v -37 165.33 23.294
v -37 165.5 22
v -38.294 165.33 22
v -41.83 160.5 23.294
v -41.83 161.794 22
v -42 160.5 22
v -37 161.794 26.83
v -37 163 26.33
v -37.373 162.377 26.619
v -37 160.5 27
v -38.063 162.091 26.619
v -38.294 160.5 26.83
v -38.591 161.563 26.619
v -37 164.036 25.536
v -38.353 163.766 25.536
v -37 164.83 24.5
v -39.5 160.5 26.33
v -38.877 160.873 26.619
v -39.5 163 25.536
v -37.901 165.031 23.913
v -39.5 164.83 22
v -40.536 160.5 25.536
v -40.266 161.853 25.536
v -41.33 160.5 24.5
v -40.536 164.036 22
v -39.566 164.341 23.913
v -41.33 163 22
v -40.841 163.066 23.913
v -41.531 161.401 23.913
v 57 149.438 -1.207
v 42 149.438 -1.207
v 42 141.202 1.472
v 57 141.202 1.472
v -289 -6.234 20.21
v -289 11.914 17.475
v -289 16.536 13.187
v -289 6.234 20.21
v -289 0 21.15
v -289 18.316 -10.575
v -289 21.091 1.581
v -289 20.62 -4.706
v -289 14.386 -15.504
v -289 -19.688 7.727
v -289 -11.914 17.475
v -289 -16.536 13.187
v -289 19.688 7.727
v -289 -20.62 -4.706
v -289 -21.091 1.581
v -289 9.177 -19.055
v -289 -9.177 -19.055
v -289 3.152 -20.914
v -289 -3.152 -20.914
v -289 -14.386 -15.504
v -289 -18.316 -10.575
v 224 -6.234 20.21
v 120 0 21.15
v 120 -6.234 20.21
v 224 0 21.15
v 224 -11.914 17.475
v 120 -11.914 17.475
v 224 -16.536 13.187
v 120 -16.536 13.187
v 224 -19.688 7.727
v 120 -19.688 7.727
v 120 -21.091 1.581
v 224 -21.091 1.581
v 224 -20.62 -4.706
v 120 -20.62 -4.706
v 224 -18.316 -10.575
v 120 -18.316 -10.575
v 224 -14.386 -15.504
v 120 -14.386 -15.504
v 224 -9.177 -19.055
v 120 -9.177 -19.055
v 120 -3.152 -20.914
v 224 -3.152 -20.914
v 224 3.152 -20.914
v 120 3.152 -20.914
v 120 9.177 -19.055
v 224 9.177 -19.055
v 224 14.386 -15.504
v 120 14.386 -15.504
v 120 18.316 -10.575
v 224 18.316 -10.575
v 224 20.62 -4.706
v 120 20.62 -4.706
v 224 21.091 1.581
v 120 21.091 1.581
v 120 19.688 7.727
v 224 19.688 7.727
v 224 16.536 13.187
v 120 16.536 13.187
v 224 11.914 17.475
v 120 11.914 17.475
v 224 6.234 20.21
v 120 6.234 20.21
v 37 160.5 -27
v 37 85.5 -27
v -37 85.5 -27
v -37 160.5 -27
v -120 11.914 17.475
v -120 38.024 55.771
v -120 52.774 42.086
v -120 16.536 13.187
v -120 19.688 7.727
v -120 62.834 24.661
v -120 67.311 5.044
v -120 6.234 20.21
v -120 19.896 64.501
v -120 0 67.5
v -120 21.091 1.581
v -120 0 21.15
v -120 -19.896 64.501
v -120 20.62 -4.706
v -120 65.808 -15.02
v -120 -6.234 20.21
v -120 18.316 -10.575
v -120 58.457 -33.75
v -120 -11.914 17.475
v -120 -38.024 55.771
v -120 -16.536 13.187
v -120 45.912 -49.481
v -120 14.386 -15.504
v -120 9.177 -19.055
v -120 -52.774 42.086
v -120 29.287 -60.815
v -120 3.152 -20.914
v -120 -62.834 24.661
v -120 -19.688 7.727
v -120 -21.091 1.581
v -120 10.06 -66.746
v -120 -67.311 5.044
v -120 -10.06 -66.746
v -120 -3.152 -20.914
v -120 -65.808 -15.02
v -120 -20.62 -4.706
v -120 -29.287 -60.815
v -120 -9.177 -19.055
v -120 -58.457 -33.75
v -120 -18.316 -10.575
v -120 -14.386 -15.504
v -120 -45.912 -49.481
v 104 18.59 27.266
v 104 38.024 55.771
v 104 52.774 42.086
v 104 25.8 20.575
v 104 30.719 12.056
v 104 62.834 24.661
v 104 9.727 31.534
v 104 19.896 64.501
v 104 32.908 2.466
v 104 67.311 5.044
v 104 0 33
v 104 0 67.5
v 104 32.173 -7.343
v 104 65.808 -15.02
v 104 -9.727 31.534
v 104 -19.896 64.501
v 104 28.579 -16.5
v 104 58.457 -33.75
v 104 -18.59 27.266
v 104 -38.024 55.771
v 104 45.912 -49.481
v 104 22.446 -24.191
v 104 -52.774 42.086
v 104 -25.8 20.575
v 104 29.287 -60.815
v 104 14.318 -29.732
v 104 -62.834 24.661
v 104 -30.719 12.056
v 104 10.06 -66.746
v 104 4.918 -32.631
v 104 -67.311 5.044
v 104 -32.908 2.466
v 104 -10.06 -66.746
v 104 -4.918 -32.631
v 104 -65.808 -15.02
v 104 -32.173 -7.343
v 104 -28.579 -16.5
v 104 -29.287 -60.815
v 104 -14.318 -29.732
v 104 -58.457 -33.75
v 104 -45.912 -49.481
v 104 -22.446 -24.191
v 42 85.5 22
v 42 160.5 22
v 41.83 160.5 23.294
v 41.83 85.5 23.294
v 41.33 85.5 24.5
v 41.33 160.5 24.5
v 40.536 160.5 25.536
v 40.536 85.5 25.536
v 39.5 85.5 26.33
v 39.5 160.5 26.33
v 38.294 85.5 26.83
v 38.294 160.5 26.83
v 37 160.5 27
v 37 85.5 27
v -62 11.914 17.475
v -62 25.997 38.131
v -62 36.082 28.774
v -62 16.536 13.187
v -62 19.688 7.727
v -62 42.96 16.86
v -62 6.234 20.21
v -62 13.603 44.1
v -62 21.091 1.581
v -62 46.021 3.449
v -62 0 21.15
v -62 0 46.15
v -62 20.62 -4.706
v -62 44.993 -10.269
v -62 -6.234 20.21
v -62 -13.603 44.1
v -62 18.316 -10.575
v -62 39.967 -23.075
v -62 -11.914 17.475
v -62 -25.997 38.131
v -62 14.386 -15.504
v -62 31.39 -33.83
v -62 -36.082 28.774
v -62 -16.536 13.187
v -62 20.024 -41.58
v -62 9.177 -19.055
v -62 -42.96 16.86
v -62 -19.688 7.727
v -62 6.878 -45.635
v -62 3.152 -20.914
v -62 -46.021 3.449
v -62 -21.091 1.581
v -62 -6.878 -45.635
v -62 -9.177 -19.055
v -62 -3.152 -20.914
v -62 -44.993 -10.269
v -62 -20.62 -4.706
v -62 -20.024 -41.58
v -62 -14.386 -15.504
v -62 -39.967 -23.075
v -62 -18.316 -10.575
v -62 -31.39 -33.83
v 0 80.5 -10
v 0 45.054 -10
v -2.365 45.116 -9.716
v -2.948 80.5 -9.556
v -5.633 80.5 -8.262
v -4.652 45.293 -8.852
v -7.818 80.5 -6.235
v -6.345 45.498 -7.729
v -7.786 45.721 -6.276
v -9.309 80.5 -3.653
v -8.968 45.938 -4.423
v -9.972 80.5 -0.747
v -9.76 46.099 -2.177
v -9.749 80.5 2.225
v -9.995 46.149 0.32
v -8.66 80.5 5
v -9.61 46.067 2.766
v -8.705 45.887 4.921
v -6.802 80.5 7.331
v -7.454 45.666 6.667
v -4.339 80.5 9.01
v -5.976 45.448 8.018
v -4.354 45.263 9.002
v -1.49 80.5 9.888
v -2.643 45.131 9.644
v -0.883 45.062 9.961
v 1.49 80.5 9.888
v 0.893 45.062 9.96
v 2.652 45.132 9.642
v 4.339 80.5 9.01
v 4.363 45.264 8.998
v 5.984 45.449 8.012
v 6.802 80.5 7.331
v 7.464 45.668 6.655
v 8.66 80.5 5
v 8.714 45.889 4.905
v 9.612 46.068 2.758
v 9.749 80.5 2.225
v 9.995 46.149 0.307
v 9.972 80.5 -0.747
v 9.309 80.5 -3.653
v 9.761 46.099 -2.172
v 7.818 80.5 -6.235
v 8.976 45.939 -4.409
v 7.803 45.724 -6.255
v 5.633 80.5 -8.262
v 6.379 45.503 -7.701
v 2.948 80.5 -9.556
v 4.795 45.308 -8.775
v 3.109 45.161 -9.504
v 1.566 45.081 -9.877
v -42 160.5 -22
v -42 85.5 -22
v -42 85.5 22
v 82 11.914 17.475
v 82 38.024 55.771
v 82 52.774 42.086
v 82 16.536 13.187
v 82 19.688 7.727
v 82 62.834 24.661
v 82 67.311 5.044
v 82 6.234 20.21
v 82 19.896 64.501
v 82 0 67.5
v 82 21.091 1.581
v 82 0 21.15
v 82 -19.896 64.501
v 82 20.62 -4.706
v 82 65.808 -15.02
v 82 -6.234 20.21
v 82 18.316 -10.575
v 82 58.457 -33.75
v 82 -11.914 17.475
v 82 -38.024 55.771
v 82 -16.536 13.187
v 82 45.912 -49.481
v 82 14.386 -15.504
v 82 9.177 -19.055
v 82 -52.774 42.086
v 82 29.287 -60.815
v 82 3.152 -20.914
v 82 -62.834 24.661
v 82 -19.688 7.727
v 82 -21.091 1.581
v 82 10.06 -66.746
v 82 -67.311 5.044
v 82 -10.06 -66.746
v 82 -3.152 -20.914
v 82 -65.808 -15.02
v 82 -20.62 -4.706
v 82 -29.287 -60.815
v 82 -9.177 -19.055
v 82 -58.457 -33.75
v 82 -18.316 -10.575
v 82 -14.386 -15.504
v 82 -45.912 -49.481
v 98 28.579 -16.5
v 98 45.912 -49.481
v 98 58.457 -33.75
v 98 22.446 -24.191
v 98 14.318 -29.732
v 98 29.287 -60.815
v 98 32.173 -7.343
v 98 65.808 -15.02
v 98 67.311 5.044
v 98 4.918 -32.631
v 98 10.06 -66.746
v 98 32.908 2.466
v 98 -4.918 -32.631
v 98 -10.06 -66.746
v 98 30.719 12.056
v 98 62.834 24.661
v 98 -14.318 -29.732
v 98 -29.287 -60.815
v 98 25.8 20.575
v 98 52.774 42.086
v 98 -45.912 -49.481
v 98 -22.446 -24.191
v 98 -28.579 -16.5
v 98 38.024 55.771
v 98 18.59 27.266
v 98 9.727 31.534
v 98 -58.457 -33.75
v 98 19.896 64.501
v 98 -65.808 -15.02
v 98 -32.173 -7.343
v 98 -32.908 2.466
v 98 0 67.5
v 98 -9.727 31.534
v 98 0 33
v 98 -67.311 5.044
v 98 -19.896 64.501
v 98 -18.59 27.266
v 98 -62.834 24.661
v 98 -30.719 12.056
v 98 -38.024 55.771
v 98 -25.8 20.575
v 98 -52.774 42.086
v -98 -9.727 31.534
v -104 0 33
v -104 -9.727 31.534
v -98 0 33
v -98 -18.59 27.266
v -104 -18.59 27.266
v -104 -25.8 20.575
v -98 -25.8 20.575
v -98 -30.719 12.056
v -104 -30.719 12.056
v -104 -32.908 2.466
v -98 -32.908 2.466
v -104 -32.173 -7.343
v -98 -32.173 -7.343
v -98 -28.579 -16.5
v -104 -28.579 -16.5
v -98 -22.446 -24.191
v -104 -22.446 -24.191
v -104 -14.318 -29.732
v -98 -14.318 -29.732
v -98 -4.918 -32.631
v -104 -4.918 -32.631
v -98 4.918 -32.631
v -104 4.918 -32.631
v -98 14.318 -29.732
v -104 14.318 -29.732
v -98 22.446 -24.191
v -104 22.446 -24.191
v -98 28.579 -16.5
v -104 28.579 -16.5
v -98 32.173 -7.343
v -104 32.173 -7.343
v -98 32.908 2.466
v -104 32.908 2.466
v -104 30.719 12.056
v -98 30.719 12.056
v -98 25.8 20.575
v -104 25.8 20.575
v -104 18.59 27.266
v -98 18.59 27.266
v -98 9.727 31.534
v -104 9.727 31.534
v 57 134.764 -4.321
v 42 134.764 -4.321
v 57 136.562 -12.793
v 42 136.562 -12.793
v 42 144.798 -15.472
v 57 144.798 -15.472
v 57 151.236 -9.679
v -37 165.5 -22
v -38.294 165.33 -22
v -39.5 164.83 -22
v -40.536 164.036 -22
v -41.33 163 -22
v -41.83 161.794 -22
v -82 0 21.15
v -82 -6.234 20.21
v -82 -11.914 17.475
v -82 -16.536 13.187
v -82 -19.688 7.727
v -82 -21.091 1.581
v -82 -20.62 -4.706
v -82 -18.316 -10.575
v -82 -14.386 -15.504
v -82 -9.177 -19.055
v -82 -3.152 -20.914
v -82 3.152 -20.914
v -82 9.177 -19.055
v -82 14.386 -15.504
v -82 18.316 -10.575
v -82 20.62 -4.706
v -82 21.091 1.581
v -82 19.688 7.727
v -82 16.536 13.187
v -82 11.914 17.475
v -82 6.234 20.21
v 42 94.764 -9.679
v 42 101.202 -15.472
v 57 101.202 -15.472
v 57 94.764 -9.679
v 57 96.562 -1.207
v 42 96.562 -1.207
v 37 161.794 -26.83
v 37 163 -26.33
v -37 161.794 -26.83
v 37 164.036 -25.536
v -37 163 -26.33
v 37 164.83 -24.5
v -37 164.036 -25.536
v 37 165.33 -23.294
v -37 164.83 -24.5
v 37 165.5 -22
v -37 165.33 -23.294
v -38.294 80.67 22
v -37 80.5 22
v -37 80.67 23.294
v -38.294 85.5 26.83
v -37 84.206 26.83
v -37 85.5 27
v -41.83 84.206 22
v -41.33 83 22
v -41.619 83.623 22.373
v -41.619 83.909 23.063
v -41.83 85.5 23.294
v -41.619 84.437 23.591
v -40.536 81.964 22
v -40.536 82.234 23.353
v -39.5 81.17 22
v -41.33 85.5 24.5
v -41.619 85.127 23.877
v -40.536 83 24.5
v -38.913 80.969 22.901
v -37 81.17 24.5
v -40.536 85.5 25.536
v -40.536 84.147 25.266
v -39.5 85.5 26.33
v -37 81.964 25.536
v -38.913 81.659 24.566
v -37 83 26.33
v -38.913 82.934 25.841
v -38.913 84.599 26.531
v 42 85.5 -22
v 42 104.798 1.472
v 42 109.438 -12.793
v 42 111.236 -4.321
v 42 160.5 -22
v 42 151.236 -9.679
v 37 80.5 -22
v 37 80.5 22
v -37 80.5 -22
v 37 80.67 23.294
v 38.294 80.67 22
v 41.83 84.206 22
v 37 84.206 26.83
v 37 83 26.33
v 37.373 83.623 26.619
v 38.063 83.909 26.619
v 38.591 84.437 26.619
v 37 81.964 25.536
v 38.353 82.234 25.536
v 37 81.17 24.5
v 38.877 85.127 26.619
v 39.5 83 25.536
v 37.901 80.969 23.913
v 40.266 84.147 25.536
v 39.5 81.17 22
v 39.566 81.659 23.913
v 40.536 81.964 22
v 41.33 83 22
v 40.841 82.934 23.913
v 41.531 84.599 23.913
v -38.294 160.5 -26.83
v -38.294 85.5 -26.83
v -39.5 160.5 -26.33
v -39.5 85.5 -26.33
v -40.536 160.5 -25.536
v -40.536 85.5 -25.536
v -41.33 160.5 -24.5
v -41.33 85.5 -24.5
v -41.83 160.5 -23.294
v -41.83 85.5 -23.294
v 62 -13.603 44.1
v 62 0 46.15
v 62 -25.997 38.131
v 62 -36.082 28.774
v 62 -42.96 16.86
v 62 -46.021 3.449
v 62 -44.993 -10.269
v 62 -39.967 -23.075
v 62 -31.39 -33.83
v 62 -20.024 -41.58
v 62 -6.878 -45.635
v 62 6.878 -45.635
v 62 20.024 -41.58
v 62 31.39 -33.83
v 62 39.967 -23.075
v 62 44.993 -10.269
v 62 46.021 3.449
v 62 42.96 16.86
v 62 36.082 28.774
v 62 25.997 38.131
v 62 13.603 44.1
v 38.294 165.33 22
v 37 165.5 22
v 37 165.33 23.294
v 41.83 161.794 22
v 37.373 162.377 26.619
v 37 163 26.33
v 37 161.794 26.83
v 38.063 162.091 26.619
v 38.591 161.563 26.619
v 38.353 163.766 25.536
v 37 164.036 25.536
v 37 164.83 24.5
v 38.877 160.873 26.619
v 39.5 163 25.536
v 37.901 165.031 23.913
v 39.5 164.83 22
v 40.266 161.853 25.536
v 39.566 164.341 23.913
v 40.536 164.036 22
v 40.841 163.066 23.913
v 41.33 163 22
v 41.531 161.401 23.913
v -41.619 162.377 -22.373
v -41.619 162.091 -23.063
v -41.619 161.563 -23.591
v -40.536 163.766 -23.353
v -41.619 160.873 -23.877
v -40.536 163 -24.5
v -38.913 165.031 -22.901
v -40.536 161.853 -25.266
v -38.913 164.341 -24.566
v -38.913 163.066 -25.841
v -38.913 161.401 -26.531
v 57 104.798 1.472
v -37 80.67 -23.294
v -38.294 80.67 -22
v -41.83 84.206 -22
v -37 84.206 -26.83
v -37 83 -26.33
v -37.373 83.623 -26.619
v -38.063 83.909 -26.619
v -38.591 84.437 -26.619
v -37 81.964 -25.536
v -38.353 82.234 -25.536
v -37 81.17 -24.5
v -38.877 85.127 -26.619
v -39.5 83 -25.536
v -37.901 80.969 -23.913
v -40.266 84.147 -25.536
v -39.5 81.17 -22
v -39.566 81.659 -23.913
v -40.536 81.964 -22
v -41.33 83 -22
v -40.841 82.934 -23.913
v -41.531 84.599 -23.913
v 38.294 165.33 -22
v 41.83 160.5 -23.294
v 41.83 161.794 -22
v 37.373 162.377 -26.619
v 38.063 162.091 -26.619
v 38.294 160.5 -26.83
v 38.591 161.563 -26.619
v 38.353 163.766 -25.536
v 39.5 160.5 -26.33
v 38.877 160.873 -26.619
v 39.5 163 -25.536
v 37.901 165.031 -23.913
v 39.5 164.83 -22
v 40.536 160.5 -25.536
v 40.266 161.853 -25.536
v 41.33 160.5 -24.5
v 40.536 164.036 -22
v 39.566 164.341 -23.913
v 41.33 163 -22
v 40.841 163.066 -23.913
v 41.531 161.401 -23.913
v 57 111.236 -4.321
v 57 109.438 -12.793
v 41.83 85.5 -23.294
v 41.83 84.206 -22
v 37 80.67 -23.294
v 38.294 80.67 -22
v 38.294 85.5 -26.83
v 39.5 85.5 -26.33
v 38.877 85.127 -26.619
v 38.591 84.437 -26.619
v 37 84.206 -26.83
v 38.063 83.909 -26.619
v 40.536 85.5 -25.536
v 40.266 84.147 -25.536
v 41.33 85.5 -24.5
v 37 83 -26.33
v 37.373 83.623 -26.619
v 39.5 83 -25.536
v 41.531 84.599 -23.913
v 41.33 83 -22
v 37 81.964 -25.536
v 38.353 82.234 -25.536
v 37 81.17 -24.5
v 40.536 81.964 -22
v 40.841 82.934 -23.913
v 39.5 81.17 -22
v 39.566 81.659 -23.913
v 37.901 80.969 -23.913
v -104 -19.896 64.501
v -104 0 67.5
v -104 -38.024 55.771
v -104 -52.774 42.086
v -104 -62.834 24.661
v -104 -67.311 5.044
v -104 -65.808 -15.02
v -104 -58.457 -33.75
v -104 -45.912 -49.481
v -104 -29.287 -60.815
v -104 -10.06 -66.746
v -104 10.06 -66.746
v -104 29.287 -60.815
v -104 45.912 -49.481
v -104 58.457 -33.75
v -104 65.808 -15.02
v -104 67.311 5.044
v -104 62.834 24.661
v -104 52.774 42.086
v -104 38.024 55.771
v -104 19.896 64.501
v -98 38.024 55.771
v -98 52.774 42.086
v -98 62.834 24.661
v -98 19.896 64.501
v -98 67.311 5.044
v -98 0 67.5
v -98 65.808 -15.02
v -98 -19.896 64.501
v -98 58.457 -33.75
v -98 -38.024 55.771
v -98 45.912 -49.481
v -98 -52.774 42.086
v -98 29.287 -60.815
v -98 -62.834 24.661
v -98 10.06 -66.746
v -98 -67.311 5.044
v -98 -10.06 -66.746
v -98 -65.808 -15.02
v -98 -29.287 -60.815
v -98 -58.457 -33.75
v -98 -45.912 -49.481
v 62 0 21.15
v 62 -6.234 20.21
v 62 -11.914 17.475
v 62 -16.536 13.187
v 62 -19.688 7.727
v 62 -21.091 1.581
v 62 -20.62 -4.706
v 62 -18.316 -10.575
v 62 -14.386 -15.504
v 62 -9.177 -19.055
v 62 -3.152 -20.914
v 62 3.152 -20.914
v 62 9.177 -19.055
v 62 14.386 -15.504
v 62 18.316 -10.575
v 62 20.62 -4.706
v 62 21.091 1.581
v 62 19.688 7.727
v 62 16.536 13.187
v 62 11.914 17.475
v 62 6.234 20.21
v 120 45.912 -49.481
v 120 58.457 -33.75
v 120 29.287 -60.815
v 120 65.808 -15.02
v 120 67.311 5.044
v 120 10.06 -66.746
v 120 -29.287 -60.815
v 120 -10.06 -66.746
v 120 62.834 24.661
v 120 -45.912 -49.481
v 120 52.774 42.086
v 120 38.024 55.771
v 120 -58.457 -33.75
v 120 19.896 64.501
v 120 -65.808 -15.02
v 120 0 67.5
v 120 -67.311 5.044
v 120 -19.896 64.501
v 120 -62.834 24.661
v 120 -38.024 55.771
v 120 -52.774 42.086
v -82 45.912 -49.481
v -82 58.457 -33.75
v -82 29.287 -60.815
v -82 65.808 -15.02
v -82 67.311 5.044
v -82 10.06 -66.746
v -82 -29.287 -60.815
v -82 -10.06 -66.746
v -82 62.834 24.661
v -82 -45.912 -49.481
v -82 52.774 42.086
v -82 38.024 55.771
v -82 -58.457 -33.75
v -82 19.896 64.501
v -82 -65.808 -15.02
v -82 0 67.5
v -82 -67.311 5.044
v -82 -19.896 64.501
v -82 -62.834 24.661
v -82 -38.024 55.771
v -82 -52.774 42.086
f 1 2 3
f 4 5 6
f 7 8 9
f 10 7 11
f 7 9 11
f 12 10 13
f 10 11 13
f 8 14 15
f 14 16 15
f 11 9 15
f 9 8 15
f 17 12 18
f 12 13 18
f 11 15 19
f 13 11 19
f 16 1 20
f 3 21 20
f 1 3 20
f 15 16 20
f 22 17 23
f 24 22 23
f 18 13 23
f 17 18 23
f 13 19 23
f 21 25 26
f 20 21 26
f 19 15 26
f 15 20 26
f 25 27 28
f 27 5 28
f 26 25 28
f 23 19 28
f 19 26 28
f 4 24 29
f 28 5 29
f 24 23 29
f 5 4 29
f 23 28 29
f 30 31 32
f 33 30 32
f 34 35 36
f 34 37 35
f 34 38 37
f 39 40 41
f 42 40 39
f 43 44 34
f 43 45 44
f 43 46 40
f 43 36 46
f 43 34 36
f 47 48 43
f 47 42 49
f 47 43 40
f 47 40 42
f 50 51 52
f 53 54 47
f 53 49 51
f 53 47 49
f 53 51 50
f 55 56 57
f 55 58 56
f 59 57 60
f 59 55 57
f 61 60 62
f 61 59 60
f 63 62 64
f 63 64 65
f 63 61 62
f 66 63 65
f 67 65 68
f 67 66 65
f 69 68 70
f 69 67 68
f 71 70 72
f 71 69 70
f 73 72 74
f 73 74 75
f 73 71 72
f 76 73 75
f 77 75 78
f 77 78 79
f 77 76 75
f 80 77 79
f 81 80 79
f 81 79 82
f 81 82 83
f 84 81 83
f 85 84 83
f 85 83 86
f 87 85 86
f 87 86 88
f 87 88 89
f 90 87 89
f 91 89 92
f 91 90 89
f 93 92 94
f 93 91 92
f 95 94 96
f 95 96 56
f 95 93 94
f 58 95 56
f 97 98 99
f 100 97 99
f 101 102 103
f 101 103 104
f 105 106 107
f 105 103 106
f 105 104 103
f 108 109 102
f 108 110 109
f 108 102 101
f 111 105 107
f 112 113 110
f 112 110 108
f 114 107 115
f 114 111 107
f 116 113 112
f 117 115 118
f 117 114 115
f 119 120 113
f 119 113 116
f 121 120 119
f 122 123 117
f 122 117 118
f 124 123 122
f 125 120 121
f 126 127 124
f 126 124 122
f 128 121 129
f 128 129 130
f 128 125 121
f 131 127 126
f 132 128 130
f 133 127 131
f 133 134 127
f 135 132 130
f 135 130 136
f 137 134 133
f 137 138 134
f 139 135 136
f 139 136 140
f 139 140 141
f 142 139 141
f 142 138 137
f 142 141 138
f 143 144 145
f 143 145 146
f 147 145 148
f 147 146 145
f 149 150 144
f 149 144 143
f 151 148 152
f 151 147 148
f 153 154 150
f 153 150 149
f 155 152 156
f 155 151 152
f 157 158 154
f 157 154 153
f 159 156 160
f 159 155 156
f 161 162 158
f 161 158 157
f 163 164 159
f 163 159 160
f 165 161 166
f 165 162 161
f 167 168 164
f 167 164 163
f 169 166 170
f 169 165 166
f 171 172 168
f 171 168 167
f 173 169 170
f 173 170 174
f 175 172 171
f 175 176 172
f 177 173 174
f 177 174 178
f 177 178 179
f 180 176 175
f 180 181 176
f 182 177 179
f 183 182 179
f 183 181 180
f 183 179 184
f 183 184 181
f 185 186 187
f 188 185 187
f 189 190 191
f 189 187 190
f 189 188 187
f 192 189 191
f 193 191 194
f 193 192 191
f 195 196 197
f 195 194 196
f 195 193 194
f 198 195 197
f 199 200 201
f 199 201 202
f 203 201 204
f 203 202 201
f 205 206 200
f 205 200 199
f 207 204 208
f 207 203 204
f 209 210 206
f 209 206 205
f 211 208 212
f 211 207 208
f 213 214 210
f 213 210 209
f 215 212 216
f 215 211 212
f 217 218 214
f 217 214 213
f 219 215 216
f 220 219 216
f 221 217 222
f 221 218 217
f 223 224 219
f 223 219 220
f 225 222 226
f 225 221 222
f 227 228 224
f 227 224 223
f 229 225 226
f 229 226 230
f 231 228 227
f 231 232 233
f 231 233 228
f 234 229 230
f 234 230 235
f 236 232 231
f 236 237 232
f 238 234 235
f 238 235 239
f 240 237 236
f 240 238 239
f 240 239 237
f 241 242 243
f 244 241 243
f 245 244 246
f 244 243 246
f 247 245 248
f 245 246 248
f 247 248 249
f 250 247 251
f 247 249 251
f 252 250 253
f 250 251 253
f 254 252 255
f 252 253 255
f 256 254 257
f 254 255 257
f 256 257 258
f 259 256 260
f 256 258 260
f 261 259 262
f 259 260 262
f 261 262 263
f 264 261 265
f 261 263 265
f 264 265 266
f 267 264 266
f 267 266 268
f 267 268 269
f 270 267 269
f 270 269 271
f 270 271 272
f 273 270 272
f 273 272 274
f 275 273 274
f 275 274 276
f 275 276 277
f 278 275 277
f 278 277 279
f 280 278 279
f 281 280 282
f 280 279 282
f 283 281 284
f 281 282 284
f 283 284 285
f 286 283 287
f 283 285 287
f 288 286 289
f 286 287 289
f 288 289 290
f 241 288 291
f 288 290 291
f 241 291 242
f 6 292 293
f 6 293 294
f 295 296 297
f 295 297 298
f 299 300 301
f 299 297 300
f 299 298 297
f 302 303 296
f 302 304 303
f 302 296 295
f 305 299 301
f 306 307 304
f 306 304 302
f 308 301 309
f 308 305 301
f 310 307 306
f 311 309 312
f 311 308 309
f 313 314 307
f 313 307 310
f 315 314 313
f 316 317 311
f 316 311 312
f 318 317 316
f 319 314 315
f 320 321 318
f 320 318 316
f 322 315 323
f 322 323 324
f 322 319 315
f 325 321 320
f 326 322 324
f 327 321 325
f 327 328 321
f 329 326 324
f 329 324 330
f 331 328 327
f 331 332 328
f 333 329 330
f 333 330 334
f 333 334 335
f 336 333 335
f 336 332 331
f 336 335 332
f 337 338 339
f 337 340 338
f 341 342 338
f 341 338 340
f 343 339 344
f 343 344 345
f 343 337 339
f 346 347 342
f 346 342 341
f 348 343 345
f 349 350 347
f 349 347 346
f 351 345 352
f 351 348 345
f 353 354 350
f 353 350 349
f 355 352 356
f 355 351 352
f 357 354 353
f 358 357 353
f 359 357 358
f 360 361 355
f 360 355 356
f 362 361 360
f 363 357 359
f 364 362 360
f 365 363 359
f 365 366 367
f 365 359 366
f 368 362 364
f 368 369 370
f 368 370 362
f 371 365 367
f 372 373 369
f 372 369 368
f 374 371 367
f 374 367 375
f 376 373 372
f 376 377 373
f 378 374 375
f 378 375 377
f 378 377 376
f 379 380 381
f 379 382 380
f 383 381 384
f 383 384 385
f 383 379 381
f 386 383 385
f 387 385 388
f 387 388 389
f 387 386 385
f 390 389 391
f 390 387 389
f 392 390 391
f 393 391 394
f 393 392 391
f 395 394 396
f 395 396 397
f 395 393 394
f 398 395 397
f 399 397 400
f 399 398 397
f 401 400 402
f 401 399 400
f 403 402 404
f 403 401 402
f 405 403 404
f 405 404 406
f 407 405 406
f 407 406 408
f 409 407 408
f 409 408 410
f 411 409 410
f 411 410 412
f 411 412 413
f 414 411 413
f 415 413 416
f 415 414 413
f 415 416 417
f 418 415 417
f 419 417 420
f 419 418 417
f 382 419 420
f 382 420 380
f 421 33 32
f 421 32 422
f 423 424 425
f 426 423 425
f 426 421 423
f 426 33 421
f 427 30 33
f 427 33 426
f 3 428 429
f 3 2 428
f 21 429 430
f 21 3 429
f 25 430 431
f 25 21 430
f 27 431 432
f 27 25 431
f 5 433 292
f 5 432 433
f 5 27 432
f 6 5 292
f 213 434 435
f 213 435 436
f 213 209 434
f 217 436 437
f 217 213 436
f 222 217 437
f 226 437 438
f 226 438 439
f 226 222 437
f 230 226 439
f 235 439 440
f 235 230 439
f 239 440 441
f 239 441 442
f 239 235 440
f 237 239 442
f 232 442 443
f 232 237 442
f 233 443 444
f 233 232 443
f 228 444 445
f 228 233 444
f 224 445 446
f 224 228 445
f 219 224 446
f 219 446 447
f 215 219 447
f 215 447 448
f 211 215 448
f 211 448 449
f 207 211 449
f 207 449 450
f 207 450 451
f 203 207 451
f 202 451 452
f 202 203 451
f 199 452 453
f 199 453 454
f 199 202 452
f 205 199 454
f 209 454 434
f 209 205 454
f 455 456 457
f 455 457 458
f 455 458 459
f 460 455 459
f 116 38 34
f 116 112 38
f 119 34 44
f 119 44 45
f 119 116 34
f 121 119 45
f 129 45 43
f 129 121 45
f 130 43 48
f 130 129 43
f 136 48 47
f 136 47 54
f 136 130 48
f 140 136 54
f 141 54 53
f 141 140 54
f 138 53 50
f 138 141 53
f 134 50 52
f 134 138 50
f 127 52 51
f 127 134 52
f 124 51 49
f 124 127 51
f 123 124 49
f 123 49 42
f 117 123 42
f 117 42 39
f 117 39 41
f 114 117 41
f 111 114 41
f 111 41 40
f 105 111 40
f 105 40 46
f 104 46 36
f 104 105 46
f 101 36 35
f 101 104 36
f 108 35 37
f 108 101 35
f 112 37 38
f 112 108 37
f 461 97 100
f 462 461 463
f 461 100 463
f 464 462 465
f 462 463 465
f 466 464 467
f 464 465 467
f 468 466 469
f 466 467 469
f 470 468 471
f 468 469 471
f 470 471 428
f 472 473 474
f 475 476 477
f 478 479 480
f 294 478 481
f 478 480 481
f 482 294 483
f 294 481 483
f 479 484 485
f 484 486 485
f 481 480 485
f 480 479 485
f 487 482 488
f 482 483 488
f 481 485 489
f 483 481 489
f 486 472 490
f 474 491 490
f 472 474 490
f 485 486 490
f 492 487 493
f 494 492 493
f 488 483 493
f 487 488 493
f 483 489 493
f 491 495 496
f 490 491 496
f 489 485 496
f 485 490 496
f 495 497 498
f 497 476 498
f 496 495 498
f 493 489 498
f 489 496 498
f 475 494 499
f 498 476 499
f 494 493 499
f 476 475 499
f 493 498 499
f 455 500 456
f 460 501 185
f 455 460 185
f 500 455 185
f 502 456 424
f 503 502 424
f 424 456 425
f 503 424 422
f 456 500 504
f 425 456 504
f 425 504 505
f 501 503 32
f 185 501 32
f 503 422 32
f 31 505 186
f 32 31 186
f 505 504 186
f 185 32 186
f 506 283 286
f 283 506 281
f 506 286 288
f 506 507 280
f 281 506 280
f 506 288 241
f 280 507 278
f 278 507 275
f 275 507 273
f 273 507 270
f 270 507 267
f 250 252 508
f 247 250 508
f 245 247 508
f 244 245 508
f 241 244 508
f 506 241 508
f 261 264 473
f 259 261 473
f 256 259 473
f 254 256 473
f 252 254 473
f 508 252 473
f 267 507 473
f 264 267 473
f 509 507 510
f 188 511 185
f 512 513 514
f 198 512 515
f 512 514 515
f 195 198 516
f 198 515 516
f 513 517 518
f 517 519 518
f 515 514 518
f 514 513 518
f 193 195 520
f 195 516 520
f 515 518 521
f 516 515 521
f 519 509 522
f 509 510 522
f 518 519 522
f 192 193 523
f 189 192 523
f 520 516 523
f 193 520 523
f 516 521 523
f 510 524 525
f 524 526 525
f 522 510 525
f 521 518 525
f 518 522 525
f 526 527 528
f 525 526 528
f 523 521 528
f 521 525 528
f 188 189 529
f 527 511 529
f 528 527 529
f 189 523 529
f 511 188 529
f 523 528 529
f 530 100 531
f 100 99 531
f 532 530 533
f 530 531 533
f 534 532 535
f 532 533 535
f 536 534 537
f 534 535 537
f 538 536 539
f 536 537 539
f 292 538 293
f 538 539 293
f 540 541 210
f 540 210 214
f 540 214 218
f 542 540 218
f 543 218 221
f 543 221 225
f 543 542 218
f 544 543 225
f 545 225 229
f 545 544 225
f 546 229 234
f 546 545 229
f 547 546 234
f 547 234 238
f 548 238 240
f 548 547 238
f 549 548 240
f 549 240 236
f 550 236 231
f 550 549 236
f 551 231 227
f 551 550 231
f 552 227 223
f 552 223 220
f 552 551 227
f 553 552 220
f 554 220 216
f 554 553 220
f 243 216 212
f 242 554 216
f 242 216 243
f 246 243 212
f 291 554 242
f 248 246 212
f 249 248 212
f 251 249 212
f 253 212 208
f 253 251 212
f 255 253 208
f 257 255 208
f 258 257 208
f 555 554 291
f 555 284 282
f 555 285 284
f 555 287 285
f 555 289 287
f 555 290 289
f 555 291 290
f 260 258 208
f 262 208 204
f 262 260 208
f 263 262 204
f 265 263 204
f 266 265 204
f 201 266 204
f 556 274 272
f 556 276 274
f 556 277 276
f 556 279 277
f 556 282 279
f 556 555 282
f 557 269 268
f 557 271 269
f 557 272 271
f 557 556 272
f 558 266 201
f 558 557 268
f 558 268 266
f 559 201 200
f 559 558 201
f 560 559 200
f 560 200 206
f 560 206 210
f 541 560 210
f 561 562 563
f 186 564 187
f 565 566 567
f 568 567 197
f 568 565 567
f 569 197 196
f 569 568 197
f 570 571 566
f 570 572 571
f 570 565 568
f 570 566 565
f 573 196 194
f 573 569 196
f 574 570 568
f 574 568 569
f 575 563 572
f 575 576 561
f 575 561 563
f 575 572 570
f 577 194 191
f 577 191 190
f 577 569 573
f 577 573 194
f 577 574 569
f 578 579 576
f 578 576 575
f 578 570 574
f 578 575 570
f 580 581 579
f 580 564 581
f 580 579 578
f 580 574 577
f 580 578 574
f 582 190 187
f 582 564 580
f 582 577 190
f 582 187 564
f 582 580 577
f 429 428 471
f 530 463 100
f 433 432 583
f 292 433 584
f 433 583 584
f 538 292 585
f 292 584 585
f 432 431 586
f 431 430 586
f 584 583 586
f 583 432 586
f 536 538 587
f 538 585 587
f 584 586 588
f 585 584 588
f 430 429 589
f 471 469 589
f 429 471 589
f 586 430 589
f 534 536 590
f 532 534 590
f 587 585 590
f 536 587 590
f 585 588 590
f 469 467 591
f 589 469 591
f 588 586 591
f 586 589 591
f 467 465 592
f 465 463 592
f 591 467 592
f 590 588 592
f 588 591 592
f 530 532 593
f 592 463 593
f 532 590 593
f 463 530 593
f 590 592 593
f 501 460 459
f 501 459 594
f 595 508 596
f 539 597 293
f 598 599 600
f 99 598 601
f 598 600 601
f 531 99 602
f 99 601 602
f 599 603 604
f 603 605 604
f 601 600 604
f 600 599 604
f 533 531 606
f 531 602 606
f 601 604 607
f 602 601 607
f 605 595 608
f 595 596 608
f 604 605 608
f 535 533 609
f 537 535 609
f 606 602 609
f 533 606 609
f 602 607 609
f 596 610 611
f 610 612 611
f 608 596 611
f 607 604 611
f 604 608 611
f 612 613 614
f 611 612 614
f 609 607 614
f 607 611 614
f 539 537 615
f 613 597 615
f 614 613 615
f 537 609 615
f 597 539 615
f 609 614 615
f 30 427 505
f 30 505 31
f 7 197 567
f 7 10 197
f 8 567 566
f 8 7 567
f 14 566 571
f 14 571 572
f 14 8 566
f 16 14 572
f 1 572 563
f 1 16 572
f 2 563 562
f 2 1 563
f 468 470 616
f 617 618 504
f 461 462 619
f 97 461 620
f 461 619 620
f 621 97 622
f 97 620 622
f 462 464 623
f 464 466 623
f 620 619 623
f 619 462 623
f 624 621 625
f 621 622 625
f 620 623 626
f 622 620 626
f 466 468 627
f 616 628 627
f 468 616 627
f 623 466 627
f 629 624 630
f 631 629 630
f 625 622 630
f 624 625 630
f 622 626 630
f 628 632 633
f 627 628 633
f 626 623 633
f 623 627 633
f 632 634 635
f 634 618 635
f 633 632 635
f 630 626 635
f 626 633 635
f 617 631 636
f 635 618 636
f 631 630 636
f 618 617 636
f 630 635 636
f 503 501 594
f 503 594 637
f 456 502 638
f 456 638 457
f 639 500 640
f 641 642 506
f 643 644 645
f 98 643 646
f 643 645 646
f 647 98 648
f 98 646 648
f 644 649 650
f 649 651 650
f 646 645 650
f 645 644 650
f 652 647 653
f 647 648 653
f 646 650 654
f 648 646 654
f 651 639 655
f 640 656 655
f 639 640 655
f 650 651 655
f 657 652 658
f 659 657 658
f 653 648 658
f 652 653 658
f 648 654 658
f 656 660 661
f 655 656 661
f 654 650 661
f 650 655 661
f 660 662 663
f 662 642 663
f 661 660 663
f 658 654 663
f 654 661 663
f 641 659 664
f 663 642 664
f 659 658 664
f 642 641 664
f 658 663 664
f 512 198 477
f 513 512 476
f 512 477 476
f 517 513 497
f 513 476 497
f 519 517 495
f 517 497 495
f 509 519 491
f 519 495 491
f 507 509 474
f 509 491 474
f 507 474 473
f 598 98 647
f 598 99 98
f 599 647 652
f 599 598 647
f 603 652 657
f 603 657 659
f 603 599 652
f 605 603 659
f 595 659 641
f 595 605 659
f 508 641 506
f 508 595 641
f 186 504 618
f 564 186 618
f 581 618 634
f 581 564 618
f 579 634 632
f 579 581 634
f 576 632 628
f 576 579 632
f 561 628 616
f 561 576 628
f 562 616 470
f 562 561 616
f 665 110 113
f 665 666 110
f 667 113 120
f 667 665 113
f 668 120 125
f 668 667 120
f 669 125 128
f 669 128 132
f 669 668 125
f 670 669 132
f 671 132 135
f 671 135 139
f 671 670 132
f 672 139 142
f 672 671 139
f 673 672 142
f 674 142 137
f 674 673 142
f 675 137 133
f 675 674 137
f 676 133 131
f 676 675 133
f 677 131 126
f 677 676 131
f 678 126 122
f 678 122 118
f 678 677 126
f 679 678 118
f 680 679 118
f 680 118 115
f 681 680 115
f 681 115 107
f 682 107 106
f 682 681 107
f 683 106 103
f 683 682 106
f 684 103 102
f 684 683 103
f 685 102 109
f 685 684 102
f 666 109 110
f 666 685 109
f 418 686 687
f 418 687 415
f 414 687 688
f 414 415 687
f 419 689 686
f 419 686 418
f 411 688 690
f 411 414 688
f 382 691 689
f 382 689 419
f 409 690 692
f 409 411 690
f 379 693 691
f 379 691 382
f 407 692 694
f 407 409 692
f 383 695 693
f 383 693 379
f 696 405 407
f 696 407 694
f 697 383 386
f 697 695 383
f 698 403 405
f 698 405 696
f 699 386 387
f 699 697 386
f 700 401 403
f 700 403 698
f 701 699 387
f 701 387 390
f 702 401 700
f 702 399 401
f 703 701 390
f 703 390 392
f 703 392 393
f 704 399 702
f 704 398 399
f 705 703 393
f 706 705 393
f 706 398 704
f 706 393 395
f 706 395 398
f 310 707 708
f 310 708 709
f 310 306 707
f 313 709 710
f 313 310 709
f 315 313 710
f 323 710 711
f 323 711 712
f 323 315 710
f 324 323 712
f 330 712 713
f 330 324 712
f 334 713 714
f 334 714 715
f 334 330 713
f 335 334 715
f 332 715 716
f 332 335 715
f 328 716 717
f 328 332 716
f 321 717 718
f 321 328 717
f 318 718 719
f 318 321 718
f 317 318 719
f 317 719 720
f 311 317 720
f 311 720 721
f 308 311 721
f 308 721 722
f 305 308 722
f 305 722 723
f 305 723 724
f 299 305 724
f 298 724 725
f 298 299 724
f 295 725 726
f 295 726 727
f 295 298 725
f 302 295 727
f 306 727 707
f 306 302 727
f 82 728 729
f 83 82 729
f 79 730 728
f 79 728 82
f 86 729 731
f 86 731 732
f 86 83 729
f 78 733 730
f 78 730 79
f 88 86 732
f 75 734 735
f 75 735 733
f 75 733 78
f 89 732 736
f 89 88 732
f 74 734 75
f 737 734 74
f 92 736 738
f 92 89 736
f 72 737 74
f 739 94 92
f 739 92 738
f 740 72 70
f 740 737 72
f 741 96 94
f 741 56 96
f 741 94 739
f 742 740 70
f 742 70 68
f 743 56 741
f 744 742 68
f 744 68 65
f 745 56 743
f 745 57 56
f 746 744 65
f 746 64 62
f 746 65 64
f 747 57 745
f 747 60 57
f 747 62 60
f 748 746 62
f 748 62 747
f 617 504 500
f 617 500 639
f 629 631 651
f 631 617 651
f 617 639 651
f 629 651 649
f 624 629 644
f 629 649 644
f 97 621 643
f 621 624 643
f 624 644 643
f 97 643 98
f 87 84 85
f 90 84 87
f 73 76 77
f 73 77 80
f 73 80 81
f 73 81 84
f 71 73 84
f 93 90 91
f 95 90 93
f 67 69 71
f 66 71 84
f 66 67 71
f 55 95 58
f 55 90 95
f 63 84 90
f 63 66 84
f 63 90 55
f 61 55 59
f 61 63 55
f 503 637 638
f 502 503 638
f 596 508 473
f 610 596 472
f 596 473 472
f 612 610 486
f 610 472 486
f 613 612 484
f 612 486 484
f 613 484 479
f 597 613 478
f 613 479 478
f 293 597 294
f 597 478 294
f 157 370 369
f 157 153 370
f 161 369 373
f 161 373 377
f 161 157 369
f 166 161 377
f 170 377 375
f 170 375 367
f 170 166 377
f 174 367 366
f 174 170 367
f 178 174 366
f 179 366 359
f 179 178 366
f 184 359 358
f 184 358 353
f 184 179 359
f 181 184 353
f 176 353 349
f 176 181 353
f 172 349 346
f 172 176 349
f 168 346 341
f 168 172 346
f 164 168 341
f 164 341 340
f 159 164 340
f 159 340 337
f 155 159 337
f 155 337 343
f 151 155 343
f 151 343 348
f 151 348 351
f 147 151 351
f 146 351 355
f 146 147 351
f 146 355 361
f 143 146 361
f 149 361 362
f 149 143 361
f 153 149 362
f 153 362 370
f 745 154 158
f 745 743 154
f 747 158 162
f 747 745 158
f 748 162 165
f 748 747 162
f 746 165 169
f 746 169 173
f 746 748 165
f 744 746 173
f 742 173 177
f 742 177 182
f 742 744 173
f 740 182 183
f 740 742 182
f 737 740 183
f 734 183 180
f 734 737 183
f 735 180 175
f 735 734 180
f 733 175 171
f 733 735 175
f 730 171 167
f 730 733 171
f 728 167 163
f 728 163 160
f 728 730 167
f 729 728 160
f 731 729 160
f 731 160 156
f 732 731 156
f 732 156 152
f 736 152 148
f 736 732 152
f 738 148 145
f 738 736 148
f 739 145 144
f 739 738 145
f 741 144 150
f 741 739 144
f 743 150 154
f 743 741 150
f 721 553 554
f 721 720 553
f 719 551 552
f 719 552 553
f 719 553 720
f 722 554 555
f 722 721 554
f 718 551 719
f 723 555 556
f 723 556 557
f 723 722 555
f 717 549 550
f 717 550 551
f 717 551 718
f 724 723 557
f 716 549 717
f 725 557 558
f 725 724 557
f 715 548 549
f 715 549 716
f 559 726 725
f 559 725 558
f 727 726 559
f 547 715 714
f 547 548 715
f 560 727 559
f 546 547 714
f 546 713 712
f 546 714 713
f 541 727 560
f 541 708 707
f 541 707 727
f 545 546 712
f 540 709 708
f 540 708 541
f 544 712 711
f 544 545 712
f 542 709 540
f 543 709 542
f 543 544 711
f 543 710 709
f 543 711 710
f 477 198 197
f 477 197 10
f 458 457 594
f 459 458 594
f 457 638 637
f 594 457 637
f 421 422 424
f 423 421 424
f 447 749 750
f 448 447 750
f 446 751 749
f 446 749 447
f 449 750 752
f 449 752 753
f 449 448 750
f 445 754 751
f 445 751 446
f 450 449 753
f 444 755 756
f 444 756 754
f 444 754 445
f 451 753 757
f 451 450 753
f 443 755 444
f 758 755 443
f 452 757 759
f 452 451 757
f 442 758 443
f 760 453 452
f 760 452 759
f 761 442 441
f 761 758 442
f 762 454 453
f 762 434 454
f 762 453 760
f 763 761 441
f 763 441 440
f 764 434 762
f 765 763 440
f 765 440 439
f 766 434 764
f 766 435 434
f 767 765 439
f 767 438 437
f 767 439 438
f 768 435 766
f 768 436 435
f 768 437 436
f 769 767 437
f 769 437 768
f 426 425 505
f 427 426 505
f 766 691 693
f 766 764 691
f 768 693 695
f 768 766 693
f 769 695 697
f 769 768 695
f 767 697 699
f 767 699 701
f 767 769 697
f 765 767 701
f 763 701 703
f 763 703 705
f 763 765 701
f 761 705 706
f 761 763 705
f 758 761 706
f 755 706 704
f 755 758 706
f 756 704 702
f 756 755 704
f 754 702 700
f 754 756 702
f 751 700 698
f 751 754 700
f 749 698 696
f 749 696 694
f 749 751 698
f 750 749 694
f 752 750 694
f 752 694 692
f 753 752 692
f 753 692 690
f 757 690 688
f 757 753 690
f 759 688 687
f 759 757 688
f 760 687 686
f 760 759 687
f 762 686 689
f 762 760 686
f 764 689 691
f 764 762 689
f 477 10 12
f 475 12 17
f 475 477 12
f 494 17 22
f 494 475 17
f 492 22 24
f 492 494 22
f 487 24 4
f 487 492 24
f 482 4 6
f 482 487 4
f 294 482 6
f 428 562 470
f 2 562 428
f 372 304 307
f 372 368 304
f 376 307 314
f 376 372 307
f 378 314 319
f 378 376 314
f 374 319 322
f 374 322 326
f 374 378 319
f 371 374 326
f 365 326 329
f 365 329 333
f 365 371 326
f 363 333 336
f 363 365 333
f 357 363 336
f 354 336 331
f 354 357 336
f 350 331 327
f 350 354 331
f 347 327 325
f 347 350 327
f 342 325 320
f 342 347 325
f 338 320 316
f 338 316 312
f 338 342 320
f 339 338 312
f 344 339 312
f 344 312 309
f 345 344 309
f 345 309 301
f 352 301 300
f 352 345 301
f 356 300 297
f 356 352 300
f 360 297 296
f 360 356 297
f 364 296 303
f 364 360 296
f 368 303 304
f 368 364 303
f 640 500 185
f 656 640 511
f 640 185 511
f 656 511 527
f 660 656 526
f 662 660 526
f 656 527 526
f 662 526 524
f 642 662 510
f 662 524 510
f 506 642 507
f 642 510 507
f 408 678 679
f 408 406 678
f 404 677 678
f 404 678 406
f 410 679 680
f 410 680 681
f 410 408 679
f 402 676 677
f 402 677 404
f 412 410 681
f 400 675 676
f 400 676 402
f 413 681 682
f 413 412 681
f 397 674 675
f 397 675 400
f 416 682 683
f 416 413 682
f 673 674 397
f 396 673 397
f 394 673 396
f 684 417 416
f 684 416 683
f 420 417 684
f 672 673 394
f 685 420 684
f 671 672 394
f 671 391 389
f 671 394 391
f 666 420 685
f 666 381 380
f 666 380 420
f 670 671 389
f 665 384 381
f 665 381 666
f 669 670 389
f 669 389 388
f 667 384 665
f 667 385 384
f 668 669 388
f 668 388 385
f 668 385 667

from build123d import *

# Parameters (mm, degrees)
SKETCH_4_R      = 10
EXTRUDE_3_DEPTH = 165.5
SKETCH_5_W      = 84
SKETCH_5_H      = 54
EXTRUDE_4_DEPTH = 85
FILLET_1_R      = 5
EXTRUDE_5_DEPTH = 15


with BuildPart() as part:
    # Эскиз3 → Повернуть2 (revolve)
    with BuildSketch(Plane(origin=(0, 0, 0), x_dir=(1, 0, 0), z_dir=(0, 1, 0))):
        Polygon((82, -67.5), (98, -67.5), (98, -33), (104, -33), (104, -67.5), (120, -67.5), (120, -21.15), (224, -21.15), (224, 0), (-289, 0), (-289, -21.15), (-120, -21.15), (-120, -67.5), (-104, -67.5), (-104, -33), (-98, -33), (-98, -67.5), (-82, -67.5), (-82, -21.15), (-62, -21.15), (-62, -46.15), (62, -46.15), (62, -21.15), (82, -21.15), align=None)
    revolve(axis=Axis((-117.293644386, 0, 0), (1, 0, 0)))

    # Эскиз4 → Вытянуть3 (add)
    with BuildSketch(Plane(origin=(0, 0, 0), x_dir=(1, 0, 0), z_dir=(0, 1, 0))):
        Circle(SKETCH_4_R)
    extrude(amount=EXTRUDE_3_DEPTH)

    # Эскиз5 → Вытянуть4 (add)
    with BuildSketch(Plane(origin=(0, 165.5, 0), x_dir=(-1, 0, 0), z_dir=(0, 1, 0))):
        Rectangle(SKETCH_5_W, SKETCH_5_H)
    extrude(amount=-EXTRUDE_4_DEPTH)

    # Скругление1
    fillet_1_edges = [part.edges().sort_by_distance(p)[0] for p in [
        (42, 165.5, 0),
        (0, 165.5, 27),
        (0, 165.5, -27),
        (-42, 165.5, 0),
        (-42, 123, -27),
        (-42, 80.5, 0),
        (0, 80.5, -27),
        (42, 80.5, 0),
        (0, 80.5, 27),
        (-42, 123, 27),
        (42, 123, -27),
        (42, 123, 27),
    ]]
    fillet(fillet_1_edges, radius=FILLET_1_R)

    # Эскиз6 → Вытянуть5 (add)
    with BuildSketch(Plane(origin=(42, 0, 0), x_dir=(0, 0, -1), z_dir=(1, 0, 0))):
        Polygon((4.321367474, 134.764410902), (12.792913111, 136.562441636), (15.471545637, 144.798030734), (9.678632526, 151.235589098), (1.207086889, 149.437558364), (-1.471545637, 141.201969266), align=None)
        Polygon((-1.471545637, 104.798030734), (4.321367474, 111.235589098), (12.792913111, 109.437558364), (15.471545637, 101.201969266), (9.678632526, 94.764410902), (1.207086889, 96.562441636), align=None)
    extrude(amount=EXTRUDE_5_DEPTH)


solid = part.part
